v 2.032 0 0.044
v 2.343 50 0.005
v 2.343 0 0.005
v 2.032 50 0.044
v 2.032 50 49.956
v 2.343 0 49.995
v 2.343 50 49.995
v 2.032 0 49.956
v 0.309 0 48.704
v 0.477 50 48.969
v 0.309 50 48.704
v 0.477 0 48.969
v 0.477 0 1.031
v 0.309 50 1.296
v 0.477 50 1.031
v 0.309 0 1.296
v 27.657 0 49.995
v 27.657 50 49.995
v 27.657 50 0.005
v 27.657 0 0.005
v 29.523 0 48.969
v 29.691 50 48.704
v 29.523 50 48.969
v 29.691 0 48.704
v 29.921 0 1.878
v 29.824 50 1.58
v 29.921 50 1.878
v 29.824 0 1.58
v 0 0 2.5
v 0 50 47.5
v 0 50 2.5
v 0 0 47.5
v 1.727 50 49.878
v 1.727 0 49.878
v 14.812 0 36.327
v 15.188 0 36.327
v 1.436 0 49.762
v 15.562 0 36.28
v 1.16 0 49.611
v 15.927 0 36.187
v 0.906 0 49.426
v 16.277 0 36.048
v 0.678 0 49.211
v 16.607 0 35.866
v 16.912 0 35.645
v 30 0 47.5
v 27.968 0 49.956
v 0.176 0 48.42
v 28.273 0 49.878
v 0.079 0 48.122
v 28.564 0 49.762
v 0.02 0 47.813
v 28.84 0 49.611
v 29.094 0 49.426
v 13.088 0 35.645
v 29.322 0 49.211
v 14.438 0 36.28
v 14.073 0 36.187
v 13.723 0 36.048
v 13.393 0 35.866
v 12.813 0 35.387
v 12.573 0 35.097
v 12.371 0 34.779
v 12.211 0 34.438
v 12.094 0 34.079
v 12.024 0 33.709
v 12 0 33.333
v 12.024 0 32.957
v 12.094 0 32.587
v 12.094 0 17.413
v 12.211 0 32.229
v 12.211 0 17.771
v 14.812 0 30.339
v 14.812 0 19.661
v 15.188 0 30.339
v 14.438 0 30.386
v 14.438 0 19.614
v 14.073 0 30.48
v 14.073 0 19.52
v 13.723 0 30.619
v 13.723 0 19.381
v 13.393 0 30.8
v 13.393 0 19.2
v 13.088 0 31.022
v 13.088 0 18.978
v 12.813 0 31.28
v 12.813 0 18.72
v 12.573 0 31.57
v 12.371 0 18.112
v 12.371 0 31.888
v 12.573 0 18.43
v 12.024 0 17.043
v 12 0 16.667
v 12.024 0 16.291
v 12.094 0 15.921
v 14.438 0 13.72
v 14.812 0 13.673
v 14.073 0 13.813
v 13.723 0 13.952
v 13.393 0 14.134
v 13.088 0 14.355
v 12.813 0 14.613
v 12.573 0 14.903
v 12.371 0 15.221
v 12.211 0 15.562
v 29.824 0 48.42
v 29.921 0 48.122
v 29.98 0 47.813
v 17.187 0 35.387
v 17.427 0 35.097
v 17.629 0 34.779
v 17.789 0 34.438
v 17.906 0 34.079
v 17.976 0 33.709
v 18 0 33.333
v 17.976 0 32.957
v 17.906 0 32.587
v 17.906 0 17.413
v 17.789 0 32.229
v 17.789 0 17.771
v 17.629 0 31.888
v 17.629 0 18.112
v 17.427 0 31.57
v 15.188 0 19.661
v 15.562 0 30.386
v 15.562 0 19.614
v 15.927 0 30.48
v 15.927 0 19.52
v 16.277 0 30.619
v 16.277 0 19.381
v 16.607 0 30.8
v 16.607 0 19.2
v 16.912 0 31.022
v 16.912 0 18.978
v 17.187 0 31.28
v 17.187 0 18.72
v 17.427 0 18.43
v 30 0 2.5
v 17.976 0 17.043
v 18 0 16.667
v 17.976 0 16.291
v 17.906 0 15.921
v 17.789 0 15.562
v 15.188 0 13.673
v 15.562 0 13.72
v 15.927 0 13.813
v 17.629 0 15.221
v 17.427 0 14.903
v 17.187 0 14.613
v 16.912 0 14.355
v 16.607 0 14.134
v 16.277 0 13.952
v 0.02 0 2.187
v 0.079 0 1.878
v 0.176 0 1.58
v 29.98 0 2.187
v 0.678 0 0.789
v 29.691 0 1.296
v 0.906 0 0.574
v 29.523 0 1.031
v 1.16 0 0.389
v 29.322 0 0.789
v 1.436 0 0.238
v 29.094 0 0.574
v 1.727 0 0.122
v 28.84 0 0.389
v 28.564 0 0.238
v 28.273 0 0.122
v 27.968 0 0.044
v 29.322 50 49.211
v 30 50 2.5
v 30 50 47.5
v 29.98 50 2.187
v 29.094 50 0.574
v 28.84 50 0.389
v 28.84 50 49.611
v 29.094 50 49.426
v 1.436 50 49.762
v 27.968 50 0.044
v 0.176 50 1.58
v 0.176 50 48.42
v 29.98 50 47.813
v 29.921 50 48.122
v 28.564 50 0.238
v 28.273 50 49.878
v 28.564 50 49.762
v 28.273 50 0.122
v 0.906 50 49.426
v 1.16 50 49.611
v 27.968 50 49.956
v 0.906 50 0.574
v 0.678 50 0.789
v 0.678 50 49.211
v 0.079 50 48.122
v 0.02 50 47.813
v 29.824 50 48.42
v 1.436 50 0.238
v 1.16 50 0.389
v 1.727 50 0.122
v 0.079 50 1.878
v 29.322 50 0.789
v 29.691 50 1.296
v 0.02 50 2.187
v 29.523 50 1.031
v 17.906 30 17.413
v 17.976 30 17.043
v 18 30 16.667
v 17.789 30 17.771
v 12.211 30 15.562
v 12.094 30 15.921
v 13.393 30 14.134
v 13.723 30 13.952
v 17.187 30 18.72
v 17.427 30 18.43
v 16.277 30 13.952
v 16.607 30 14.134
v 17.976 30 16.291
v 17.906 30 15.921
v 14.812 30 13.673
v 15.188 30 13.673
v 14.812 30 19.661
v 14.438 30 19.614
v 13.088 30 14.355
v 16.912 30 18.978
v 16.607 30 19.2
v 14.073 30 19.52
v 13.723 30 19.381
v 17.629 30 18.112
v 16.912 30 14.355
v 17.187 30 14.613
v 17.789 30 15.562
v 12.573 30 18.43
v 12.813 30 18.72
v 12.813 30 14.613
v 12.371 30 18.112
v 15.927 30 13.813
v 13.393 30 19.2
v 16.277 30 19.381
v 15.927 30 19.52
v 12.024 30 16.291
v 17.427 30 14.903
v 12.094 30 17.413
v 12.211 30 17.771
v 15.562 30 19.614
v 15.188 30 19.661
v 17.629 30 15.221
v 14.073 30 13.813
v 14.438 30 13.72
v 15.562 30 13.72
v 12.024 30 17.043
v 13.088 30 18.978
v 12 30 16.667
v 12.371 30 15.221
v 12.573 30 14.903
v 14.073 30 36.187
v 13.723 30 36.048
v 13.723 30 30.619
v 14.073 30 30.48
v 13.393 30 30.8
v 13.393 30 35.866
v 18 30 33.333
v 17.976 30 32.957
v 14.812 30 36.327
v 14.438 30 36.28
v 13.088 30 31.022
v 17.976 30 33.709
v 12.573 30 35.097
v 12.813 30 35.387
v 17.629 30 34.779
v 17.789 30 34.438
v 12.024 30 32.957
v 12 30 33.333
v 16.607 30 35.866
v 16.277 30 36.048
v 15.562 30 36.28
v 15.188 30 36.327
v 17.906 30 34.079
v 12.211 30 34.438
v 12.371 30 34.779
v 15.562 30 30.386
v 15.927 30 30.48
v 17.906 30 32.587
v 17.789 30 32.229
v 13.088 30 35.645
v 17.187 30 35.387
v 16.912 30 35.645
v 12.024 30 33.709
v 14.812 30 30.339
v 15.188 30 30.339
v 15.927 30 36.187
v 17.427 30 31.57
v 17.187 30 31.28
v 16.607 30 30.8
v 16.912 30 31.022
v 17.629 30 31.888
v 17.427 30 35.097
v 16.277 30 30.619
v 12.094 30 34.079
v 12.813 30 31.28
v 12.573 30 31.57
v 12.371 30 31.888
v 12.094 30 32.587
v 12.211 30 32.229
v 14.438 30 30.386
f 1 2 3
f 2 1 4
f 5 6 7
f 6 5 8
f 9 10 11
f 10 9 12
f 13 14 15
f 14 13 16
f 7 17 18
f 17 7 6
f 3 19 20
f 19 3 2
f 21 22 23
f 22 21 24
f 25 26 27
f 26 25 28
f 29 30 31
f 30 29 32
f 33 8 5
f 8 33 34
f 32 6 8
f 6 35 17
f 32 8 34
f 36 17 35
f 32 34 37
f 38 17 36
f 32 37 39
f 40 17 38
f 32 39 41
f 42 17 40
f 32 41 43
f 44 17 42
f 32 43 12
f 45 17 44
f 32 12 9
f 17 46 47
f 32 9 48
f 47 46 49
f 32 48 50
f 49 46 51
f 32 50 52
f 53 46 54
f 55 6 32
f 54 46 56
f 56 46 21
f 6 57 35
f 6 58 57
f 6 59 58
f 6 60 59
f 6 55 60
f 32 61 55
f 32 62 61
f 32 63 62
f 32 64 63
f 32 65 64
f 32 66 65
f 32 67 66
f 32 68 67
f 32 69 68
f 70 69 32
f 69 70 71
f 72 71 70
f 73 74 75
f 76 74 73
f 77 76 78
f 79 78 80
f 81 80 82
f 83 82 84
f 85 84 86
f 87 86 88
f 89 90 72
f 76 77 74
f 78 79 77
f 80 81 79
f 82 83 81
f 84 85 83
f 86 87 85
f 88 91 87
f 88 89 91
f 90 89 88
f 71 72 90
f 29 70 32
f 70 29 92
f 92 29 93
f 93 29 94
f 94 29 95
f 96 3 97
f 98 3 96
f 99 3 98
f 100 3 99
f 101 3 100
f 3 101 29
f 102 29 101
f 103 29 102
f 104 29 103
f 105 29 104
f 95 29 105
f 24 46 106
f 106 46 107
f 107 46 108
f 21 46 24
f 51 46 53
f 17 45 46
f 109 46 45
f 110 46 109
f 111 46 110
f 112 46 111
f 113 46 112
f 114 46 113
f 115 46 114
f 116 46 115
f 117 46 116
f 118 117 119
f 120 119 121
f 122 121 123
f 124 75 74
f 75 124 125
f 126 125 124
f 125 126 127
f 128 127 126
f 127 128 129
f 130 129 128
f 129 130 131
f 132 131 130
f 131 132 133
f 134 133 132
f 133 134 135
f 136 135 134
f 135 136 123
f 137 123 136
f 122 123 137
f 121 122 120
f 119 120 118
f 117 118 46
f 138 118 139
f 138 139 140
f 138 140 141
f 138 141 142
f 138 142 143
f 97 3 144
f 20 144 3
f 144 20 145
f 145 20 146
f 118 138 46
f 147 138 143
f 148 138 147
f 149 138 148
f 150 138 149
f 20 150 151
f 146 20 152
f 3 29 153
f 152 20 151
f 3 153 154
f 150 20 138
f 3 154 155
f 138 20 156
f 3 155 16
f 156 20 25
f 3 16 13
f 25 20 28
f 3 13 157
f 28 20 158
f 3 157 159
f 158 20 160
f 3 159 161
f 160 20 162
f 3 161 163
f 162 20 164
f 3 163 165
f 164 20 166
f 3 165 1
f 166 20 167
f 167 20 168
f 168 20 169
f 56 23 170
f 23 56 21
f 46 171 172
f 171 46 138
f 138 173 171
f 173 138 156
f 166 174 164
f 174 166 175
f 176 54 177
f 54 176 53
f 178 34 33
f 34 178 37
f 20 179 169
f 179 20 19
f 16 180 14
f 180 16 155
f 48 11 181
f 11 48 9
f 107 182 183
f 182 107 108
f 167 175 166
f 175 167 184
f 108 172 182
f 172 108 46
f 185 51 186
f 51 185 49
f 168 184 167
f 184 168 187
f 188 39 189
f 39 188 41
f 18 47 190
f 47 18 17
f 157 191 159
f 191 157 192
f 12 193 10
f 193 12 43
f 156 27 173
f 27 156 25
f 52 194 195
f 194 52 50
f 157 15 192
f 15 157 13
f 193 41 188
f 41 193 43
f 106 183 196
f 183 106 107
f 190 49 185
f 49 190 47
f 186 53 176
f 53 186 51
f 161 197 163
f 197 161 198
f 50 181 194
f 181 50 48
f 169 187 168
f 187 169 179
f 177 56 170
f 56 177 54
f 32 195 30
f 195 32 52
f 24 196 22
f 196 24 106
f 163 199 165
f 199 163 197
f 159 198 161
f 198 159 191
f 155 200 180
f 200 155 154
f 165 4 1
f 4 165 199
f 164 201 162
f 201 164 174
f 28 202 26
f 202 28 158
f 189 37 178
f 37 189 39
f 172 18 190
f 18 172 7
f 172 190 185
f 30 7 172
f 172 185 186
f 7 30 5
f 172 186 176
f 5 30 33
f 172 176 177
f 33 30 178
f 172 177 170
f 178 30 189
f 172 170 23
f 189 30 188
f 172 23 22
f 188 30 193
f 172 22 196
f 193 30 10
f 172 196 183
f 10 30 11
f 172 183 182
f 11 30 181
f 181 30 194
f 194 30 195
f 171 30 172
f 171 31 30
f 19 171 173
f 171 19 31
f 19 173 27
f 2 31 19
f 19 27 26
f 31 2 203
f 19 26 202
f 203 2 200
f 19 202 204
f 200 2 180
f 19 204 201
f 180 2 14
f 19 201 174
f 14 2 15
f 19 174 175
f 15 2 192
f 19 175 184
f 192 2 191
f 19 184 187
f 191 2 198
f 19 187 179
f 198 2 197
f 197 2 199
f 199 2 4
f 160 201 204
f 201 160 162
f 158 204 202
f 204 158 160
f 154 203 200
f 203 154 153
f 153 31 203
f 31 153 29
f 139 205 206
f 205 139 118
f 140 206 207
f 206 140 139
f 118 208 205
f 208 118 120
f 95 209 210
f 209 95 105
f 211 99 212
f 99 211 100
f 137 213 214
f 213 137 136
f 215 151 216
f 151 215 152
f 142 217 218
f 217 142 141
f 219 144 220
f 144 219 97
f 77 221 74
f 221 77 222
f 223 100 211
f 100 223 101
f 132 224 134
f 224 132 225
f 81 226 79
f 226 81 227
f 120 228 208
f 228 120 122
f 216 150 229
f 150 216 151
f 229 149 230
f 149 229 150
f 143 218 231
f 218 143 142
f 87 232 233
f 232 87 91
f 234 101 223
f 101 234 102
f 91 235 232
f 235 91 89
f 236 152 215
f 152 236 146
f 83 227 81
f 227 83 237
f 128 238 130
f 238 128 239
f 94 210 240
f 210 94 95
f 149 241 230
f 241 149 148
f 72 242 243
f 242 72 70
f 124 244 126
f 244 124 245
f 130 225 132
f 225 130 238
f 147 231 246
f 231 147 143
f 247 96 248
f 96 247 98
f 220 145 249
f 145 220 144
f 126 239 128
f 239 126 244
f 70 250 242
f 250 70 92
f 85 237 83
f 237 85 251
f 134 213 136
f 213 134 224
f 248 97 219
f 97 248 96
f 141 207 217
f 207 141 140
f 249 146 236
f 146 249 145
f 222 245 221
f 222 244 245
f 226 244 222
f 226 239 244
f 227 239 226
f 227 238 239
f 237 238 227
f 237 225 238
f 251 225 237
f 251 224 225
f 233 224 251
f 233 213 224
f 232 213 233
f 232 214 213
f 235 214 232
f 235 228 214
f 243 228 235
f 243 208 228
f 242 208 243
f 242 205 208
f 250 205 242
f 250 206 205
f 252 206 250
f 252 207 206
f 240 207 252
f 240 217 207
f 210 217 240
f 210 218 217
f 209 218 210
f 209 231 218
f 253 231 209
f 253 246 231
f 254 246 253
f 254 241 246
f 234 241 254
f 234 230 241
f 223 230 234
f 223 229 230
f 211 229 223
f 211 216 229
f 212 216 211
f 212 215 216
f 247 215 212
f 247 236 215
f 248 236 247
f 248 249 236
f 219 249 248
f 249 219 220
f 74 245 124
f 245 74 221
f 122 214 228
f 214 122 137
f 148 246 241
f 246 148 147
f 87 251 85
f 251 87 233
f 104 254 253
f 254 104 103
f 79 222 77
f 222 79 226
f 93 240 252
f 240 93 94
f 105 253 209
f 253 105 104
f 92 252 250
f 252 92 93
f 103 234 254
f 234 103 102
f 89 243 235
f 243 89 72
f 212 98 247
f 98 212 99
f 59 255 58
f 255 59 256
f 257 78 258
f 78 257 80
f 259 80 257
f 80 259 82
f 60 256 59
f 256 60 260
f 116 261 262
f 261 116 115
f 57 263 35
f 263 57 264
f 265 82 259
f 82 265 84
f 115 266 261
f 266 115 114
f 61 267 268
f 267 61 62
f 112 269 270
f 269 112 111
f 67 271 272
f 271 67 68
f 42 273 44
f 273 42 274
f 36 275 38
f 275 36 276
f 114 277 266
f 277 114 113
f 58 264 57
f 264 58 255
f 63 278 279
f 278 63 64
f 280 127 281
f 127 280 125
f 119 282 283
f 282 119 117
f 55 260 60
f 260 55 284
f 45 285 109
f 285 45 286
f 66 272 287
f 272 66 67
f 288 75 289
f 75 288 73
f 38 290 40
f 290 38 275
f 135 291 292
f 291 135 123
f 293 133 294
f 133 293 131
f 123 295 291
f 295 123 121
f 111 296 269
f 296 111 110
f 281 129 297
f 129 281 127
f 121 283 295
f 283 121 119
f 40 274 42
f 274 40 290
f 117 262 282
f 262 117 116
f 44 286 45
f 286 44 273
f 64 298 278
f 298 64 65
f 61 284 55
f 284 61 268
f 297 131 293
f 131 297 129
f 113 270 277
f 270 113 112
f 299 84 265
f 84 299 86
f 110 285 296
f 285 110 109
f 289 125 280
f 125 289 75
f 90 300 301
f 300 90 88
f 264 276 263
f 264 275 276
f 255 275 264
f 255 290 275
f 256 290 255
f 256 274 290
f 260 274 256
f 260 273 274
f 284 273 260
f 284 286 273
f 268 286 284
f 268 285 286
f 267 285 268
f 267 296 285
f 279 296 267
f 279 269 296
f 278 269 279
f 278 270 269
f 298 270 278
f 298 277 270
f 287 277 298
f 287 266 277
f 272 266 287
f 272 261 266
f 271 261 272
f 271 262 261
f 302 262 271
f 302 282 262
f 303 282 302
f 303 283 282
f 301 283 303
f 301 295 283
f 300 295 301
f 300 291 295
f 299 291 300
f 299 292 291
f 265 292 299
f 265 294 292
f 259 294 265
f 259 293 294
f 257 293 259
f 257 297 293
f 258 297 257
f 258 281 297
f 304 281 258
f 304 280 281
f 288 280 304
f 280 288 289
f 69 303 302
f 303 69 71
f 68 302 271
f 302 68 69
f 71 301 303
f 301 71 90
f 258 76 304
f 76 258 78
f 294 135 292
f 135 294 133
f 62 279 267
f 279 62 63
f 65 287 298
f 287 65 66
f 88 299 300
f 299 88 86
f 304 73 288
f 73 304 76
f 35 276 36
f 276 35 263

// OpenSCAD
$fn=50;

width=30;
depth=50;
height=50;
screw_diameter=6.0;
screw_depth=30.0;
corner=5.0;

module hole() {
    translate([screw_diameter/2, screw_depth, screw_diameter/2])
        rotate(90, [1, 0, 0])
            cylinder(h=screw_depth+1, d=screw_diameter, center=false);
}

difference() {

    minkowski() {
        translate([corner/2, corner, corner/2])
            rotate(90, [1, 0, 0])
                cylinder(h=corner, d=corner, center=false);
        translate([0, 0, 0])
            cube([width-corner, depth-corner, height-corner], center=false);
    }

    translate([width/2-screw_diameter/2, 0, height/3-screw_diameter/2])
        hole();
    translate([width/2-screw_diameter/2, 0, 2 * height/3-screw_diameter/2])
        hole();

}
